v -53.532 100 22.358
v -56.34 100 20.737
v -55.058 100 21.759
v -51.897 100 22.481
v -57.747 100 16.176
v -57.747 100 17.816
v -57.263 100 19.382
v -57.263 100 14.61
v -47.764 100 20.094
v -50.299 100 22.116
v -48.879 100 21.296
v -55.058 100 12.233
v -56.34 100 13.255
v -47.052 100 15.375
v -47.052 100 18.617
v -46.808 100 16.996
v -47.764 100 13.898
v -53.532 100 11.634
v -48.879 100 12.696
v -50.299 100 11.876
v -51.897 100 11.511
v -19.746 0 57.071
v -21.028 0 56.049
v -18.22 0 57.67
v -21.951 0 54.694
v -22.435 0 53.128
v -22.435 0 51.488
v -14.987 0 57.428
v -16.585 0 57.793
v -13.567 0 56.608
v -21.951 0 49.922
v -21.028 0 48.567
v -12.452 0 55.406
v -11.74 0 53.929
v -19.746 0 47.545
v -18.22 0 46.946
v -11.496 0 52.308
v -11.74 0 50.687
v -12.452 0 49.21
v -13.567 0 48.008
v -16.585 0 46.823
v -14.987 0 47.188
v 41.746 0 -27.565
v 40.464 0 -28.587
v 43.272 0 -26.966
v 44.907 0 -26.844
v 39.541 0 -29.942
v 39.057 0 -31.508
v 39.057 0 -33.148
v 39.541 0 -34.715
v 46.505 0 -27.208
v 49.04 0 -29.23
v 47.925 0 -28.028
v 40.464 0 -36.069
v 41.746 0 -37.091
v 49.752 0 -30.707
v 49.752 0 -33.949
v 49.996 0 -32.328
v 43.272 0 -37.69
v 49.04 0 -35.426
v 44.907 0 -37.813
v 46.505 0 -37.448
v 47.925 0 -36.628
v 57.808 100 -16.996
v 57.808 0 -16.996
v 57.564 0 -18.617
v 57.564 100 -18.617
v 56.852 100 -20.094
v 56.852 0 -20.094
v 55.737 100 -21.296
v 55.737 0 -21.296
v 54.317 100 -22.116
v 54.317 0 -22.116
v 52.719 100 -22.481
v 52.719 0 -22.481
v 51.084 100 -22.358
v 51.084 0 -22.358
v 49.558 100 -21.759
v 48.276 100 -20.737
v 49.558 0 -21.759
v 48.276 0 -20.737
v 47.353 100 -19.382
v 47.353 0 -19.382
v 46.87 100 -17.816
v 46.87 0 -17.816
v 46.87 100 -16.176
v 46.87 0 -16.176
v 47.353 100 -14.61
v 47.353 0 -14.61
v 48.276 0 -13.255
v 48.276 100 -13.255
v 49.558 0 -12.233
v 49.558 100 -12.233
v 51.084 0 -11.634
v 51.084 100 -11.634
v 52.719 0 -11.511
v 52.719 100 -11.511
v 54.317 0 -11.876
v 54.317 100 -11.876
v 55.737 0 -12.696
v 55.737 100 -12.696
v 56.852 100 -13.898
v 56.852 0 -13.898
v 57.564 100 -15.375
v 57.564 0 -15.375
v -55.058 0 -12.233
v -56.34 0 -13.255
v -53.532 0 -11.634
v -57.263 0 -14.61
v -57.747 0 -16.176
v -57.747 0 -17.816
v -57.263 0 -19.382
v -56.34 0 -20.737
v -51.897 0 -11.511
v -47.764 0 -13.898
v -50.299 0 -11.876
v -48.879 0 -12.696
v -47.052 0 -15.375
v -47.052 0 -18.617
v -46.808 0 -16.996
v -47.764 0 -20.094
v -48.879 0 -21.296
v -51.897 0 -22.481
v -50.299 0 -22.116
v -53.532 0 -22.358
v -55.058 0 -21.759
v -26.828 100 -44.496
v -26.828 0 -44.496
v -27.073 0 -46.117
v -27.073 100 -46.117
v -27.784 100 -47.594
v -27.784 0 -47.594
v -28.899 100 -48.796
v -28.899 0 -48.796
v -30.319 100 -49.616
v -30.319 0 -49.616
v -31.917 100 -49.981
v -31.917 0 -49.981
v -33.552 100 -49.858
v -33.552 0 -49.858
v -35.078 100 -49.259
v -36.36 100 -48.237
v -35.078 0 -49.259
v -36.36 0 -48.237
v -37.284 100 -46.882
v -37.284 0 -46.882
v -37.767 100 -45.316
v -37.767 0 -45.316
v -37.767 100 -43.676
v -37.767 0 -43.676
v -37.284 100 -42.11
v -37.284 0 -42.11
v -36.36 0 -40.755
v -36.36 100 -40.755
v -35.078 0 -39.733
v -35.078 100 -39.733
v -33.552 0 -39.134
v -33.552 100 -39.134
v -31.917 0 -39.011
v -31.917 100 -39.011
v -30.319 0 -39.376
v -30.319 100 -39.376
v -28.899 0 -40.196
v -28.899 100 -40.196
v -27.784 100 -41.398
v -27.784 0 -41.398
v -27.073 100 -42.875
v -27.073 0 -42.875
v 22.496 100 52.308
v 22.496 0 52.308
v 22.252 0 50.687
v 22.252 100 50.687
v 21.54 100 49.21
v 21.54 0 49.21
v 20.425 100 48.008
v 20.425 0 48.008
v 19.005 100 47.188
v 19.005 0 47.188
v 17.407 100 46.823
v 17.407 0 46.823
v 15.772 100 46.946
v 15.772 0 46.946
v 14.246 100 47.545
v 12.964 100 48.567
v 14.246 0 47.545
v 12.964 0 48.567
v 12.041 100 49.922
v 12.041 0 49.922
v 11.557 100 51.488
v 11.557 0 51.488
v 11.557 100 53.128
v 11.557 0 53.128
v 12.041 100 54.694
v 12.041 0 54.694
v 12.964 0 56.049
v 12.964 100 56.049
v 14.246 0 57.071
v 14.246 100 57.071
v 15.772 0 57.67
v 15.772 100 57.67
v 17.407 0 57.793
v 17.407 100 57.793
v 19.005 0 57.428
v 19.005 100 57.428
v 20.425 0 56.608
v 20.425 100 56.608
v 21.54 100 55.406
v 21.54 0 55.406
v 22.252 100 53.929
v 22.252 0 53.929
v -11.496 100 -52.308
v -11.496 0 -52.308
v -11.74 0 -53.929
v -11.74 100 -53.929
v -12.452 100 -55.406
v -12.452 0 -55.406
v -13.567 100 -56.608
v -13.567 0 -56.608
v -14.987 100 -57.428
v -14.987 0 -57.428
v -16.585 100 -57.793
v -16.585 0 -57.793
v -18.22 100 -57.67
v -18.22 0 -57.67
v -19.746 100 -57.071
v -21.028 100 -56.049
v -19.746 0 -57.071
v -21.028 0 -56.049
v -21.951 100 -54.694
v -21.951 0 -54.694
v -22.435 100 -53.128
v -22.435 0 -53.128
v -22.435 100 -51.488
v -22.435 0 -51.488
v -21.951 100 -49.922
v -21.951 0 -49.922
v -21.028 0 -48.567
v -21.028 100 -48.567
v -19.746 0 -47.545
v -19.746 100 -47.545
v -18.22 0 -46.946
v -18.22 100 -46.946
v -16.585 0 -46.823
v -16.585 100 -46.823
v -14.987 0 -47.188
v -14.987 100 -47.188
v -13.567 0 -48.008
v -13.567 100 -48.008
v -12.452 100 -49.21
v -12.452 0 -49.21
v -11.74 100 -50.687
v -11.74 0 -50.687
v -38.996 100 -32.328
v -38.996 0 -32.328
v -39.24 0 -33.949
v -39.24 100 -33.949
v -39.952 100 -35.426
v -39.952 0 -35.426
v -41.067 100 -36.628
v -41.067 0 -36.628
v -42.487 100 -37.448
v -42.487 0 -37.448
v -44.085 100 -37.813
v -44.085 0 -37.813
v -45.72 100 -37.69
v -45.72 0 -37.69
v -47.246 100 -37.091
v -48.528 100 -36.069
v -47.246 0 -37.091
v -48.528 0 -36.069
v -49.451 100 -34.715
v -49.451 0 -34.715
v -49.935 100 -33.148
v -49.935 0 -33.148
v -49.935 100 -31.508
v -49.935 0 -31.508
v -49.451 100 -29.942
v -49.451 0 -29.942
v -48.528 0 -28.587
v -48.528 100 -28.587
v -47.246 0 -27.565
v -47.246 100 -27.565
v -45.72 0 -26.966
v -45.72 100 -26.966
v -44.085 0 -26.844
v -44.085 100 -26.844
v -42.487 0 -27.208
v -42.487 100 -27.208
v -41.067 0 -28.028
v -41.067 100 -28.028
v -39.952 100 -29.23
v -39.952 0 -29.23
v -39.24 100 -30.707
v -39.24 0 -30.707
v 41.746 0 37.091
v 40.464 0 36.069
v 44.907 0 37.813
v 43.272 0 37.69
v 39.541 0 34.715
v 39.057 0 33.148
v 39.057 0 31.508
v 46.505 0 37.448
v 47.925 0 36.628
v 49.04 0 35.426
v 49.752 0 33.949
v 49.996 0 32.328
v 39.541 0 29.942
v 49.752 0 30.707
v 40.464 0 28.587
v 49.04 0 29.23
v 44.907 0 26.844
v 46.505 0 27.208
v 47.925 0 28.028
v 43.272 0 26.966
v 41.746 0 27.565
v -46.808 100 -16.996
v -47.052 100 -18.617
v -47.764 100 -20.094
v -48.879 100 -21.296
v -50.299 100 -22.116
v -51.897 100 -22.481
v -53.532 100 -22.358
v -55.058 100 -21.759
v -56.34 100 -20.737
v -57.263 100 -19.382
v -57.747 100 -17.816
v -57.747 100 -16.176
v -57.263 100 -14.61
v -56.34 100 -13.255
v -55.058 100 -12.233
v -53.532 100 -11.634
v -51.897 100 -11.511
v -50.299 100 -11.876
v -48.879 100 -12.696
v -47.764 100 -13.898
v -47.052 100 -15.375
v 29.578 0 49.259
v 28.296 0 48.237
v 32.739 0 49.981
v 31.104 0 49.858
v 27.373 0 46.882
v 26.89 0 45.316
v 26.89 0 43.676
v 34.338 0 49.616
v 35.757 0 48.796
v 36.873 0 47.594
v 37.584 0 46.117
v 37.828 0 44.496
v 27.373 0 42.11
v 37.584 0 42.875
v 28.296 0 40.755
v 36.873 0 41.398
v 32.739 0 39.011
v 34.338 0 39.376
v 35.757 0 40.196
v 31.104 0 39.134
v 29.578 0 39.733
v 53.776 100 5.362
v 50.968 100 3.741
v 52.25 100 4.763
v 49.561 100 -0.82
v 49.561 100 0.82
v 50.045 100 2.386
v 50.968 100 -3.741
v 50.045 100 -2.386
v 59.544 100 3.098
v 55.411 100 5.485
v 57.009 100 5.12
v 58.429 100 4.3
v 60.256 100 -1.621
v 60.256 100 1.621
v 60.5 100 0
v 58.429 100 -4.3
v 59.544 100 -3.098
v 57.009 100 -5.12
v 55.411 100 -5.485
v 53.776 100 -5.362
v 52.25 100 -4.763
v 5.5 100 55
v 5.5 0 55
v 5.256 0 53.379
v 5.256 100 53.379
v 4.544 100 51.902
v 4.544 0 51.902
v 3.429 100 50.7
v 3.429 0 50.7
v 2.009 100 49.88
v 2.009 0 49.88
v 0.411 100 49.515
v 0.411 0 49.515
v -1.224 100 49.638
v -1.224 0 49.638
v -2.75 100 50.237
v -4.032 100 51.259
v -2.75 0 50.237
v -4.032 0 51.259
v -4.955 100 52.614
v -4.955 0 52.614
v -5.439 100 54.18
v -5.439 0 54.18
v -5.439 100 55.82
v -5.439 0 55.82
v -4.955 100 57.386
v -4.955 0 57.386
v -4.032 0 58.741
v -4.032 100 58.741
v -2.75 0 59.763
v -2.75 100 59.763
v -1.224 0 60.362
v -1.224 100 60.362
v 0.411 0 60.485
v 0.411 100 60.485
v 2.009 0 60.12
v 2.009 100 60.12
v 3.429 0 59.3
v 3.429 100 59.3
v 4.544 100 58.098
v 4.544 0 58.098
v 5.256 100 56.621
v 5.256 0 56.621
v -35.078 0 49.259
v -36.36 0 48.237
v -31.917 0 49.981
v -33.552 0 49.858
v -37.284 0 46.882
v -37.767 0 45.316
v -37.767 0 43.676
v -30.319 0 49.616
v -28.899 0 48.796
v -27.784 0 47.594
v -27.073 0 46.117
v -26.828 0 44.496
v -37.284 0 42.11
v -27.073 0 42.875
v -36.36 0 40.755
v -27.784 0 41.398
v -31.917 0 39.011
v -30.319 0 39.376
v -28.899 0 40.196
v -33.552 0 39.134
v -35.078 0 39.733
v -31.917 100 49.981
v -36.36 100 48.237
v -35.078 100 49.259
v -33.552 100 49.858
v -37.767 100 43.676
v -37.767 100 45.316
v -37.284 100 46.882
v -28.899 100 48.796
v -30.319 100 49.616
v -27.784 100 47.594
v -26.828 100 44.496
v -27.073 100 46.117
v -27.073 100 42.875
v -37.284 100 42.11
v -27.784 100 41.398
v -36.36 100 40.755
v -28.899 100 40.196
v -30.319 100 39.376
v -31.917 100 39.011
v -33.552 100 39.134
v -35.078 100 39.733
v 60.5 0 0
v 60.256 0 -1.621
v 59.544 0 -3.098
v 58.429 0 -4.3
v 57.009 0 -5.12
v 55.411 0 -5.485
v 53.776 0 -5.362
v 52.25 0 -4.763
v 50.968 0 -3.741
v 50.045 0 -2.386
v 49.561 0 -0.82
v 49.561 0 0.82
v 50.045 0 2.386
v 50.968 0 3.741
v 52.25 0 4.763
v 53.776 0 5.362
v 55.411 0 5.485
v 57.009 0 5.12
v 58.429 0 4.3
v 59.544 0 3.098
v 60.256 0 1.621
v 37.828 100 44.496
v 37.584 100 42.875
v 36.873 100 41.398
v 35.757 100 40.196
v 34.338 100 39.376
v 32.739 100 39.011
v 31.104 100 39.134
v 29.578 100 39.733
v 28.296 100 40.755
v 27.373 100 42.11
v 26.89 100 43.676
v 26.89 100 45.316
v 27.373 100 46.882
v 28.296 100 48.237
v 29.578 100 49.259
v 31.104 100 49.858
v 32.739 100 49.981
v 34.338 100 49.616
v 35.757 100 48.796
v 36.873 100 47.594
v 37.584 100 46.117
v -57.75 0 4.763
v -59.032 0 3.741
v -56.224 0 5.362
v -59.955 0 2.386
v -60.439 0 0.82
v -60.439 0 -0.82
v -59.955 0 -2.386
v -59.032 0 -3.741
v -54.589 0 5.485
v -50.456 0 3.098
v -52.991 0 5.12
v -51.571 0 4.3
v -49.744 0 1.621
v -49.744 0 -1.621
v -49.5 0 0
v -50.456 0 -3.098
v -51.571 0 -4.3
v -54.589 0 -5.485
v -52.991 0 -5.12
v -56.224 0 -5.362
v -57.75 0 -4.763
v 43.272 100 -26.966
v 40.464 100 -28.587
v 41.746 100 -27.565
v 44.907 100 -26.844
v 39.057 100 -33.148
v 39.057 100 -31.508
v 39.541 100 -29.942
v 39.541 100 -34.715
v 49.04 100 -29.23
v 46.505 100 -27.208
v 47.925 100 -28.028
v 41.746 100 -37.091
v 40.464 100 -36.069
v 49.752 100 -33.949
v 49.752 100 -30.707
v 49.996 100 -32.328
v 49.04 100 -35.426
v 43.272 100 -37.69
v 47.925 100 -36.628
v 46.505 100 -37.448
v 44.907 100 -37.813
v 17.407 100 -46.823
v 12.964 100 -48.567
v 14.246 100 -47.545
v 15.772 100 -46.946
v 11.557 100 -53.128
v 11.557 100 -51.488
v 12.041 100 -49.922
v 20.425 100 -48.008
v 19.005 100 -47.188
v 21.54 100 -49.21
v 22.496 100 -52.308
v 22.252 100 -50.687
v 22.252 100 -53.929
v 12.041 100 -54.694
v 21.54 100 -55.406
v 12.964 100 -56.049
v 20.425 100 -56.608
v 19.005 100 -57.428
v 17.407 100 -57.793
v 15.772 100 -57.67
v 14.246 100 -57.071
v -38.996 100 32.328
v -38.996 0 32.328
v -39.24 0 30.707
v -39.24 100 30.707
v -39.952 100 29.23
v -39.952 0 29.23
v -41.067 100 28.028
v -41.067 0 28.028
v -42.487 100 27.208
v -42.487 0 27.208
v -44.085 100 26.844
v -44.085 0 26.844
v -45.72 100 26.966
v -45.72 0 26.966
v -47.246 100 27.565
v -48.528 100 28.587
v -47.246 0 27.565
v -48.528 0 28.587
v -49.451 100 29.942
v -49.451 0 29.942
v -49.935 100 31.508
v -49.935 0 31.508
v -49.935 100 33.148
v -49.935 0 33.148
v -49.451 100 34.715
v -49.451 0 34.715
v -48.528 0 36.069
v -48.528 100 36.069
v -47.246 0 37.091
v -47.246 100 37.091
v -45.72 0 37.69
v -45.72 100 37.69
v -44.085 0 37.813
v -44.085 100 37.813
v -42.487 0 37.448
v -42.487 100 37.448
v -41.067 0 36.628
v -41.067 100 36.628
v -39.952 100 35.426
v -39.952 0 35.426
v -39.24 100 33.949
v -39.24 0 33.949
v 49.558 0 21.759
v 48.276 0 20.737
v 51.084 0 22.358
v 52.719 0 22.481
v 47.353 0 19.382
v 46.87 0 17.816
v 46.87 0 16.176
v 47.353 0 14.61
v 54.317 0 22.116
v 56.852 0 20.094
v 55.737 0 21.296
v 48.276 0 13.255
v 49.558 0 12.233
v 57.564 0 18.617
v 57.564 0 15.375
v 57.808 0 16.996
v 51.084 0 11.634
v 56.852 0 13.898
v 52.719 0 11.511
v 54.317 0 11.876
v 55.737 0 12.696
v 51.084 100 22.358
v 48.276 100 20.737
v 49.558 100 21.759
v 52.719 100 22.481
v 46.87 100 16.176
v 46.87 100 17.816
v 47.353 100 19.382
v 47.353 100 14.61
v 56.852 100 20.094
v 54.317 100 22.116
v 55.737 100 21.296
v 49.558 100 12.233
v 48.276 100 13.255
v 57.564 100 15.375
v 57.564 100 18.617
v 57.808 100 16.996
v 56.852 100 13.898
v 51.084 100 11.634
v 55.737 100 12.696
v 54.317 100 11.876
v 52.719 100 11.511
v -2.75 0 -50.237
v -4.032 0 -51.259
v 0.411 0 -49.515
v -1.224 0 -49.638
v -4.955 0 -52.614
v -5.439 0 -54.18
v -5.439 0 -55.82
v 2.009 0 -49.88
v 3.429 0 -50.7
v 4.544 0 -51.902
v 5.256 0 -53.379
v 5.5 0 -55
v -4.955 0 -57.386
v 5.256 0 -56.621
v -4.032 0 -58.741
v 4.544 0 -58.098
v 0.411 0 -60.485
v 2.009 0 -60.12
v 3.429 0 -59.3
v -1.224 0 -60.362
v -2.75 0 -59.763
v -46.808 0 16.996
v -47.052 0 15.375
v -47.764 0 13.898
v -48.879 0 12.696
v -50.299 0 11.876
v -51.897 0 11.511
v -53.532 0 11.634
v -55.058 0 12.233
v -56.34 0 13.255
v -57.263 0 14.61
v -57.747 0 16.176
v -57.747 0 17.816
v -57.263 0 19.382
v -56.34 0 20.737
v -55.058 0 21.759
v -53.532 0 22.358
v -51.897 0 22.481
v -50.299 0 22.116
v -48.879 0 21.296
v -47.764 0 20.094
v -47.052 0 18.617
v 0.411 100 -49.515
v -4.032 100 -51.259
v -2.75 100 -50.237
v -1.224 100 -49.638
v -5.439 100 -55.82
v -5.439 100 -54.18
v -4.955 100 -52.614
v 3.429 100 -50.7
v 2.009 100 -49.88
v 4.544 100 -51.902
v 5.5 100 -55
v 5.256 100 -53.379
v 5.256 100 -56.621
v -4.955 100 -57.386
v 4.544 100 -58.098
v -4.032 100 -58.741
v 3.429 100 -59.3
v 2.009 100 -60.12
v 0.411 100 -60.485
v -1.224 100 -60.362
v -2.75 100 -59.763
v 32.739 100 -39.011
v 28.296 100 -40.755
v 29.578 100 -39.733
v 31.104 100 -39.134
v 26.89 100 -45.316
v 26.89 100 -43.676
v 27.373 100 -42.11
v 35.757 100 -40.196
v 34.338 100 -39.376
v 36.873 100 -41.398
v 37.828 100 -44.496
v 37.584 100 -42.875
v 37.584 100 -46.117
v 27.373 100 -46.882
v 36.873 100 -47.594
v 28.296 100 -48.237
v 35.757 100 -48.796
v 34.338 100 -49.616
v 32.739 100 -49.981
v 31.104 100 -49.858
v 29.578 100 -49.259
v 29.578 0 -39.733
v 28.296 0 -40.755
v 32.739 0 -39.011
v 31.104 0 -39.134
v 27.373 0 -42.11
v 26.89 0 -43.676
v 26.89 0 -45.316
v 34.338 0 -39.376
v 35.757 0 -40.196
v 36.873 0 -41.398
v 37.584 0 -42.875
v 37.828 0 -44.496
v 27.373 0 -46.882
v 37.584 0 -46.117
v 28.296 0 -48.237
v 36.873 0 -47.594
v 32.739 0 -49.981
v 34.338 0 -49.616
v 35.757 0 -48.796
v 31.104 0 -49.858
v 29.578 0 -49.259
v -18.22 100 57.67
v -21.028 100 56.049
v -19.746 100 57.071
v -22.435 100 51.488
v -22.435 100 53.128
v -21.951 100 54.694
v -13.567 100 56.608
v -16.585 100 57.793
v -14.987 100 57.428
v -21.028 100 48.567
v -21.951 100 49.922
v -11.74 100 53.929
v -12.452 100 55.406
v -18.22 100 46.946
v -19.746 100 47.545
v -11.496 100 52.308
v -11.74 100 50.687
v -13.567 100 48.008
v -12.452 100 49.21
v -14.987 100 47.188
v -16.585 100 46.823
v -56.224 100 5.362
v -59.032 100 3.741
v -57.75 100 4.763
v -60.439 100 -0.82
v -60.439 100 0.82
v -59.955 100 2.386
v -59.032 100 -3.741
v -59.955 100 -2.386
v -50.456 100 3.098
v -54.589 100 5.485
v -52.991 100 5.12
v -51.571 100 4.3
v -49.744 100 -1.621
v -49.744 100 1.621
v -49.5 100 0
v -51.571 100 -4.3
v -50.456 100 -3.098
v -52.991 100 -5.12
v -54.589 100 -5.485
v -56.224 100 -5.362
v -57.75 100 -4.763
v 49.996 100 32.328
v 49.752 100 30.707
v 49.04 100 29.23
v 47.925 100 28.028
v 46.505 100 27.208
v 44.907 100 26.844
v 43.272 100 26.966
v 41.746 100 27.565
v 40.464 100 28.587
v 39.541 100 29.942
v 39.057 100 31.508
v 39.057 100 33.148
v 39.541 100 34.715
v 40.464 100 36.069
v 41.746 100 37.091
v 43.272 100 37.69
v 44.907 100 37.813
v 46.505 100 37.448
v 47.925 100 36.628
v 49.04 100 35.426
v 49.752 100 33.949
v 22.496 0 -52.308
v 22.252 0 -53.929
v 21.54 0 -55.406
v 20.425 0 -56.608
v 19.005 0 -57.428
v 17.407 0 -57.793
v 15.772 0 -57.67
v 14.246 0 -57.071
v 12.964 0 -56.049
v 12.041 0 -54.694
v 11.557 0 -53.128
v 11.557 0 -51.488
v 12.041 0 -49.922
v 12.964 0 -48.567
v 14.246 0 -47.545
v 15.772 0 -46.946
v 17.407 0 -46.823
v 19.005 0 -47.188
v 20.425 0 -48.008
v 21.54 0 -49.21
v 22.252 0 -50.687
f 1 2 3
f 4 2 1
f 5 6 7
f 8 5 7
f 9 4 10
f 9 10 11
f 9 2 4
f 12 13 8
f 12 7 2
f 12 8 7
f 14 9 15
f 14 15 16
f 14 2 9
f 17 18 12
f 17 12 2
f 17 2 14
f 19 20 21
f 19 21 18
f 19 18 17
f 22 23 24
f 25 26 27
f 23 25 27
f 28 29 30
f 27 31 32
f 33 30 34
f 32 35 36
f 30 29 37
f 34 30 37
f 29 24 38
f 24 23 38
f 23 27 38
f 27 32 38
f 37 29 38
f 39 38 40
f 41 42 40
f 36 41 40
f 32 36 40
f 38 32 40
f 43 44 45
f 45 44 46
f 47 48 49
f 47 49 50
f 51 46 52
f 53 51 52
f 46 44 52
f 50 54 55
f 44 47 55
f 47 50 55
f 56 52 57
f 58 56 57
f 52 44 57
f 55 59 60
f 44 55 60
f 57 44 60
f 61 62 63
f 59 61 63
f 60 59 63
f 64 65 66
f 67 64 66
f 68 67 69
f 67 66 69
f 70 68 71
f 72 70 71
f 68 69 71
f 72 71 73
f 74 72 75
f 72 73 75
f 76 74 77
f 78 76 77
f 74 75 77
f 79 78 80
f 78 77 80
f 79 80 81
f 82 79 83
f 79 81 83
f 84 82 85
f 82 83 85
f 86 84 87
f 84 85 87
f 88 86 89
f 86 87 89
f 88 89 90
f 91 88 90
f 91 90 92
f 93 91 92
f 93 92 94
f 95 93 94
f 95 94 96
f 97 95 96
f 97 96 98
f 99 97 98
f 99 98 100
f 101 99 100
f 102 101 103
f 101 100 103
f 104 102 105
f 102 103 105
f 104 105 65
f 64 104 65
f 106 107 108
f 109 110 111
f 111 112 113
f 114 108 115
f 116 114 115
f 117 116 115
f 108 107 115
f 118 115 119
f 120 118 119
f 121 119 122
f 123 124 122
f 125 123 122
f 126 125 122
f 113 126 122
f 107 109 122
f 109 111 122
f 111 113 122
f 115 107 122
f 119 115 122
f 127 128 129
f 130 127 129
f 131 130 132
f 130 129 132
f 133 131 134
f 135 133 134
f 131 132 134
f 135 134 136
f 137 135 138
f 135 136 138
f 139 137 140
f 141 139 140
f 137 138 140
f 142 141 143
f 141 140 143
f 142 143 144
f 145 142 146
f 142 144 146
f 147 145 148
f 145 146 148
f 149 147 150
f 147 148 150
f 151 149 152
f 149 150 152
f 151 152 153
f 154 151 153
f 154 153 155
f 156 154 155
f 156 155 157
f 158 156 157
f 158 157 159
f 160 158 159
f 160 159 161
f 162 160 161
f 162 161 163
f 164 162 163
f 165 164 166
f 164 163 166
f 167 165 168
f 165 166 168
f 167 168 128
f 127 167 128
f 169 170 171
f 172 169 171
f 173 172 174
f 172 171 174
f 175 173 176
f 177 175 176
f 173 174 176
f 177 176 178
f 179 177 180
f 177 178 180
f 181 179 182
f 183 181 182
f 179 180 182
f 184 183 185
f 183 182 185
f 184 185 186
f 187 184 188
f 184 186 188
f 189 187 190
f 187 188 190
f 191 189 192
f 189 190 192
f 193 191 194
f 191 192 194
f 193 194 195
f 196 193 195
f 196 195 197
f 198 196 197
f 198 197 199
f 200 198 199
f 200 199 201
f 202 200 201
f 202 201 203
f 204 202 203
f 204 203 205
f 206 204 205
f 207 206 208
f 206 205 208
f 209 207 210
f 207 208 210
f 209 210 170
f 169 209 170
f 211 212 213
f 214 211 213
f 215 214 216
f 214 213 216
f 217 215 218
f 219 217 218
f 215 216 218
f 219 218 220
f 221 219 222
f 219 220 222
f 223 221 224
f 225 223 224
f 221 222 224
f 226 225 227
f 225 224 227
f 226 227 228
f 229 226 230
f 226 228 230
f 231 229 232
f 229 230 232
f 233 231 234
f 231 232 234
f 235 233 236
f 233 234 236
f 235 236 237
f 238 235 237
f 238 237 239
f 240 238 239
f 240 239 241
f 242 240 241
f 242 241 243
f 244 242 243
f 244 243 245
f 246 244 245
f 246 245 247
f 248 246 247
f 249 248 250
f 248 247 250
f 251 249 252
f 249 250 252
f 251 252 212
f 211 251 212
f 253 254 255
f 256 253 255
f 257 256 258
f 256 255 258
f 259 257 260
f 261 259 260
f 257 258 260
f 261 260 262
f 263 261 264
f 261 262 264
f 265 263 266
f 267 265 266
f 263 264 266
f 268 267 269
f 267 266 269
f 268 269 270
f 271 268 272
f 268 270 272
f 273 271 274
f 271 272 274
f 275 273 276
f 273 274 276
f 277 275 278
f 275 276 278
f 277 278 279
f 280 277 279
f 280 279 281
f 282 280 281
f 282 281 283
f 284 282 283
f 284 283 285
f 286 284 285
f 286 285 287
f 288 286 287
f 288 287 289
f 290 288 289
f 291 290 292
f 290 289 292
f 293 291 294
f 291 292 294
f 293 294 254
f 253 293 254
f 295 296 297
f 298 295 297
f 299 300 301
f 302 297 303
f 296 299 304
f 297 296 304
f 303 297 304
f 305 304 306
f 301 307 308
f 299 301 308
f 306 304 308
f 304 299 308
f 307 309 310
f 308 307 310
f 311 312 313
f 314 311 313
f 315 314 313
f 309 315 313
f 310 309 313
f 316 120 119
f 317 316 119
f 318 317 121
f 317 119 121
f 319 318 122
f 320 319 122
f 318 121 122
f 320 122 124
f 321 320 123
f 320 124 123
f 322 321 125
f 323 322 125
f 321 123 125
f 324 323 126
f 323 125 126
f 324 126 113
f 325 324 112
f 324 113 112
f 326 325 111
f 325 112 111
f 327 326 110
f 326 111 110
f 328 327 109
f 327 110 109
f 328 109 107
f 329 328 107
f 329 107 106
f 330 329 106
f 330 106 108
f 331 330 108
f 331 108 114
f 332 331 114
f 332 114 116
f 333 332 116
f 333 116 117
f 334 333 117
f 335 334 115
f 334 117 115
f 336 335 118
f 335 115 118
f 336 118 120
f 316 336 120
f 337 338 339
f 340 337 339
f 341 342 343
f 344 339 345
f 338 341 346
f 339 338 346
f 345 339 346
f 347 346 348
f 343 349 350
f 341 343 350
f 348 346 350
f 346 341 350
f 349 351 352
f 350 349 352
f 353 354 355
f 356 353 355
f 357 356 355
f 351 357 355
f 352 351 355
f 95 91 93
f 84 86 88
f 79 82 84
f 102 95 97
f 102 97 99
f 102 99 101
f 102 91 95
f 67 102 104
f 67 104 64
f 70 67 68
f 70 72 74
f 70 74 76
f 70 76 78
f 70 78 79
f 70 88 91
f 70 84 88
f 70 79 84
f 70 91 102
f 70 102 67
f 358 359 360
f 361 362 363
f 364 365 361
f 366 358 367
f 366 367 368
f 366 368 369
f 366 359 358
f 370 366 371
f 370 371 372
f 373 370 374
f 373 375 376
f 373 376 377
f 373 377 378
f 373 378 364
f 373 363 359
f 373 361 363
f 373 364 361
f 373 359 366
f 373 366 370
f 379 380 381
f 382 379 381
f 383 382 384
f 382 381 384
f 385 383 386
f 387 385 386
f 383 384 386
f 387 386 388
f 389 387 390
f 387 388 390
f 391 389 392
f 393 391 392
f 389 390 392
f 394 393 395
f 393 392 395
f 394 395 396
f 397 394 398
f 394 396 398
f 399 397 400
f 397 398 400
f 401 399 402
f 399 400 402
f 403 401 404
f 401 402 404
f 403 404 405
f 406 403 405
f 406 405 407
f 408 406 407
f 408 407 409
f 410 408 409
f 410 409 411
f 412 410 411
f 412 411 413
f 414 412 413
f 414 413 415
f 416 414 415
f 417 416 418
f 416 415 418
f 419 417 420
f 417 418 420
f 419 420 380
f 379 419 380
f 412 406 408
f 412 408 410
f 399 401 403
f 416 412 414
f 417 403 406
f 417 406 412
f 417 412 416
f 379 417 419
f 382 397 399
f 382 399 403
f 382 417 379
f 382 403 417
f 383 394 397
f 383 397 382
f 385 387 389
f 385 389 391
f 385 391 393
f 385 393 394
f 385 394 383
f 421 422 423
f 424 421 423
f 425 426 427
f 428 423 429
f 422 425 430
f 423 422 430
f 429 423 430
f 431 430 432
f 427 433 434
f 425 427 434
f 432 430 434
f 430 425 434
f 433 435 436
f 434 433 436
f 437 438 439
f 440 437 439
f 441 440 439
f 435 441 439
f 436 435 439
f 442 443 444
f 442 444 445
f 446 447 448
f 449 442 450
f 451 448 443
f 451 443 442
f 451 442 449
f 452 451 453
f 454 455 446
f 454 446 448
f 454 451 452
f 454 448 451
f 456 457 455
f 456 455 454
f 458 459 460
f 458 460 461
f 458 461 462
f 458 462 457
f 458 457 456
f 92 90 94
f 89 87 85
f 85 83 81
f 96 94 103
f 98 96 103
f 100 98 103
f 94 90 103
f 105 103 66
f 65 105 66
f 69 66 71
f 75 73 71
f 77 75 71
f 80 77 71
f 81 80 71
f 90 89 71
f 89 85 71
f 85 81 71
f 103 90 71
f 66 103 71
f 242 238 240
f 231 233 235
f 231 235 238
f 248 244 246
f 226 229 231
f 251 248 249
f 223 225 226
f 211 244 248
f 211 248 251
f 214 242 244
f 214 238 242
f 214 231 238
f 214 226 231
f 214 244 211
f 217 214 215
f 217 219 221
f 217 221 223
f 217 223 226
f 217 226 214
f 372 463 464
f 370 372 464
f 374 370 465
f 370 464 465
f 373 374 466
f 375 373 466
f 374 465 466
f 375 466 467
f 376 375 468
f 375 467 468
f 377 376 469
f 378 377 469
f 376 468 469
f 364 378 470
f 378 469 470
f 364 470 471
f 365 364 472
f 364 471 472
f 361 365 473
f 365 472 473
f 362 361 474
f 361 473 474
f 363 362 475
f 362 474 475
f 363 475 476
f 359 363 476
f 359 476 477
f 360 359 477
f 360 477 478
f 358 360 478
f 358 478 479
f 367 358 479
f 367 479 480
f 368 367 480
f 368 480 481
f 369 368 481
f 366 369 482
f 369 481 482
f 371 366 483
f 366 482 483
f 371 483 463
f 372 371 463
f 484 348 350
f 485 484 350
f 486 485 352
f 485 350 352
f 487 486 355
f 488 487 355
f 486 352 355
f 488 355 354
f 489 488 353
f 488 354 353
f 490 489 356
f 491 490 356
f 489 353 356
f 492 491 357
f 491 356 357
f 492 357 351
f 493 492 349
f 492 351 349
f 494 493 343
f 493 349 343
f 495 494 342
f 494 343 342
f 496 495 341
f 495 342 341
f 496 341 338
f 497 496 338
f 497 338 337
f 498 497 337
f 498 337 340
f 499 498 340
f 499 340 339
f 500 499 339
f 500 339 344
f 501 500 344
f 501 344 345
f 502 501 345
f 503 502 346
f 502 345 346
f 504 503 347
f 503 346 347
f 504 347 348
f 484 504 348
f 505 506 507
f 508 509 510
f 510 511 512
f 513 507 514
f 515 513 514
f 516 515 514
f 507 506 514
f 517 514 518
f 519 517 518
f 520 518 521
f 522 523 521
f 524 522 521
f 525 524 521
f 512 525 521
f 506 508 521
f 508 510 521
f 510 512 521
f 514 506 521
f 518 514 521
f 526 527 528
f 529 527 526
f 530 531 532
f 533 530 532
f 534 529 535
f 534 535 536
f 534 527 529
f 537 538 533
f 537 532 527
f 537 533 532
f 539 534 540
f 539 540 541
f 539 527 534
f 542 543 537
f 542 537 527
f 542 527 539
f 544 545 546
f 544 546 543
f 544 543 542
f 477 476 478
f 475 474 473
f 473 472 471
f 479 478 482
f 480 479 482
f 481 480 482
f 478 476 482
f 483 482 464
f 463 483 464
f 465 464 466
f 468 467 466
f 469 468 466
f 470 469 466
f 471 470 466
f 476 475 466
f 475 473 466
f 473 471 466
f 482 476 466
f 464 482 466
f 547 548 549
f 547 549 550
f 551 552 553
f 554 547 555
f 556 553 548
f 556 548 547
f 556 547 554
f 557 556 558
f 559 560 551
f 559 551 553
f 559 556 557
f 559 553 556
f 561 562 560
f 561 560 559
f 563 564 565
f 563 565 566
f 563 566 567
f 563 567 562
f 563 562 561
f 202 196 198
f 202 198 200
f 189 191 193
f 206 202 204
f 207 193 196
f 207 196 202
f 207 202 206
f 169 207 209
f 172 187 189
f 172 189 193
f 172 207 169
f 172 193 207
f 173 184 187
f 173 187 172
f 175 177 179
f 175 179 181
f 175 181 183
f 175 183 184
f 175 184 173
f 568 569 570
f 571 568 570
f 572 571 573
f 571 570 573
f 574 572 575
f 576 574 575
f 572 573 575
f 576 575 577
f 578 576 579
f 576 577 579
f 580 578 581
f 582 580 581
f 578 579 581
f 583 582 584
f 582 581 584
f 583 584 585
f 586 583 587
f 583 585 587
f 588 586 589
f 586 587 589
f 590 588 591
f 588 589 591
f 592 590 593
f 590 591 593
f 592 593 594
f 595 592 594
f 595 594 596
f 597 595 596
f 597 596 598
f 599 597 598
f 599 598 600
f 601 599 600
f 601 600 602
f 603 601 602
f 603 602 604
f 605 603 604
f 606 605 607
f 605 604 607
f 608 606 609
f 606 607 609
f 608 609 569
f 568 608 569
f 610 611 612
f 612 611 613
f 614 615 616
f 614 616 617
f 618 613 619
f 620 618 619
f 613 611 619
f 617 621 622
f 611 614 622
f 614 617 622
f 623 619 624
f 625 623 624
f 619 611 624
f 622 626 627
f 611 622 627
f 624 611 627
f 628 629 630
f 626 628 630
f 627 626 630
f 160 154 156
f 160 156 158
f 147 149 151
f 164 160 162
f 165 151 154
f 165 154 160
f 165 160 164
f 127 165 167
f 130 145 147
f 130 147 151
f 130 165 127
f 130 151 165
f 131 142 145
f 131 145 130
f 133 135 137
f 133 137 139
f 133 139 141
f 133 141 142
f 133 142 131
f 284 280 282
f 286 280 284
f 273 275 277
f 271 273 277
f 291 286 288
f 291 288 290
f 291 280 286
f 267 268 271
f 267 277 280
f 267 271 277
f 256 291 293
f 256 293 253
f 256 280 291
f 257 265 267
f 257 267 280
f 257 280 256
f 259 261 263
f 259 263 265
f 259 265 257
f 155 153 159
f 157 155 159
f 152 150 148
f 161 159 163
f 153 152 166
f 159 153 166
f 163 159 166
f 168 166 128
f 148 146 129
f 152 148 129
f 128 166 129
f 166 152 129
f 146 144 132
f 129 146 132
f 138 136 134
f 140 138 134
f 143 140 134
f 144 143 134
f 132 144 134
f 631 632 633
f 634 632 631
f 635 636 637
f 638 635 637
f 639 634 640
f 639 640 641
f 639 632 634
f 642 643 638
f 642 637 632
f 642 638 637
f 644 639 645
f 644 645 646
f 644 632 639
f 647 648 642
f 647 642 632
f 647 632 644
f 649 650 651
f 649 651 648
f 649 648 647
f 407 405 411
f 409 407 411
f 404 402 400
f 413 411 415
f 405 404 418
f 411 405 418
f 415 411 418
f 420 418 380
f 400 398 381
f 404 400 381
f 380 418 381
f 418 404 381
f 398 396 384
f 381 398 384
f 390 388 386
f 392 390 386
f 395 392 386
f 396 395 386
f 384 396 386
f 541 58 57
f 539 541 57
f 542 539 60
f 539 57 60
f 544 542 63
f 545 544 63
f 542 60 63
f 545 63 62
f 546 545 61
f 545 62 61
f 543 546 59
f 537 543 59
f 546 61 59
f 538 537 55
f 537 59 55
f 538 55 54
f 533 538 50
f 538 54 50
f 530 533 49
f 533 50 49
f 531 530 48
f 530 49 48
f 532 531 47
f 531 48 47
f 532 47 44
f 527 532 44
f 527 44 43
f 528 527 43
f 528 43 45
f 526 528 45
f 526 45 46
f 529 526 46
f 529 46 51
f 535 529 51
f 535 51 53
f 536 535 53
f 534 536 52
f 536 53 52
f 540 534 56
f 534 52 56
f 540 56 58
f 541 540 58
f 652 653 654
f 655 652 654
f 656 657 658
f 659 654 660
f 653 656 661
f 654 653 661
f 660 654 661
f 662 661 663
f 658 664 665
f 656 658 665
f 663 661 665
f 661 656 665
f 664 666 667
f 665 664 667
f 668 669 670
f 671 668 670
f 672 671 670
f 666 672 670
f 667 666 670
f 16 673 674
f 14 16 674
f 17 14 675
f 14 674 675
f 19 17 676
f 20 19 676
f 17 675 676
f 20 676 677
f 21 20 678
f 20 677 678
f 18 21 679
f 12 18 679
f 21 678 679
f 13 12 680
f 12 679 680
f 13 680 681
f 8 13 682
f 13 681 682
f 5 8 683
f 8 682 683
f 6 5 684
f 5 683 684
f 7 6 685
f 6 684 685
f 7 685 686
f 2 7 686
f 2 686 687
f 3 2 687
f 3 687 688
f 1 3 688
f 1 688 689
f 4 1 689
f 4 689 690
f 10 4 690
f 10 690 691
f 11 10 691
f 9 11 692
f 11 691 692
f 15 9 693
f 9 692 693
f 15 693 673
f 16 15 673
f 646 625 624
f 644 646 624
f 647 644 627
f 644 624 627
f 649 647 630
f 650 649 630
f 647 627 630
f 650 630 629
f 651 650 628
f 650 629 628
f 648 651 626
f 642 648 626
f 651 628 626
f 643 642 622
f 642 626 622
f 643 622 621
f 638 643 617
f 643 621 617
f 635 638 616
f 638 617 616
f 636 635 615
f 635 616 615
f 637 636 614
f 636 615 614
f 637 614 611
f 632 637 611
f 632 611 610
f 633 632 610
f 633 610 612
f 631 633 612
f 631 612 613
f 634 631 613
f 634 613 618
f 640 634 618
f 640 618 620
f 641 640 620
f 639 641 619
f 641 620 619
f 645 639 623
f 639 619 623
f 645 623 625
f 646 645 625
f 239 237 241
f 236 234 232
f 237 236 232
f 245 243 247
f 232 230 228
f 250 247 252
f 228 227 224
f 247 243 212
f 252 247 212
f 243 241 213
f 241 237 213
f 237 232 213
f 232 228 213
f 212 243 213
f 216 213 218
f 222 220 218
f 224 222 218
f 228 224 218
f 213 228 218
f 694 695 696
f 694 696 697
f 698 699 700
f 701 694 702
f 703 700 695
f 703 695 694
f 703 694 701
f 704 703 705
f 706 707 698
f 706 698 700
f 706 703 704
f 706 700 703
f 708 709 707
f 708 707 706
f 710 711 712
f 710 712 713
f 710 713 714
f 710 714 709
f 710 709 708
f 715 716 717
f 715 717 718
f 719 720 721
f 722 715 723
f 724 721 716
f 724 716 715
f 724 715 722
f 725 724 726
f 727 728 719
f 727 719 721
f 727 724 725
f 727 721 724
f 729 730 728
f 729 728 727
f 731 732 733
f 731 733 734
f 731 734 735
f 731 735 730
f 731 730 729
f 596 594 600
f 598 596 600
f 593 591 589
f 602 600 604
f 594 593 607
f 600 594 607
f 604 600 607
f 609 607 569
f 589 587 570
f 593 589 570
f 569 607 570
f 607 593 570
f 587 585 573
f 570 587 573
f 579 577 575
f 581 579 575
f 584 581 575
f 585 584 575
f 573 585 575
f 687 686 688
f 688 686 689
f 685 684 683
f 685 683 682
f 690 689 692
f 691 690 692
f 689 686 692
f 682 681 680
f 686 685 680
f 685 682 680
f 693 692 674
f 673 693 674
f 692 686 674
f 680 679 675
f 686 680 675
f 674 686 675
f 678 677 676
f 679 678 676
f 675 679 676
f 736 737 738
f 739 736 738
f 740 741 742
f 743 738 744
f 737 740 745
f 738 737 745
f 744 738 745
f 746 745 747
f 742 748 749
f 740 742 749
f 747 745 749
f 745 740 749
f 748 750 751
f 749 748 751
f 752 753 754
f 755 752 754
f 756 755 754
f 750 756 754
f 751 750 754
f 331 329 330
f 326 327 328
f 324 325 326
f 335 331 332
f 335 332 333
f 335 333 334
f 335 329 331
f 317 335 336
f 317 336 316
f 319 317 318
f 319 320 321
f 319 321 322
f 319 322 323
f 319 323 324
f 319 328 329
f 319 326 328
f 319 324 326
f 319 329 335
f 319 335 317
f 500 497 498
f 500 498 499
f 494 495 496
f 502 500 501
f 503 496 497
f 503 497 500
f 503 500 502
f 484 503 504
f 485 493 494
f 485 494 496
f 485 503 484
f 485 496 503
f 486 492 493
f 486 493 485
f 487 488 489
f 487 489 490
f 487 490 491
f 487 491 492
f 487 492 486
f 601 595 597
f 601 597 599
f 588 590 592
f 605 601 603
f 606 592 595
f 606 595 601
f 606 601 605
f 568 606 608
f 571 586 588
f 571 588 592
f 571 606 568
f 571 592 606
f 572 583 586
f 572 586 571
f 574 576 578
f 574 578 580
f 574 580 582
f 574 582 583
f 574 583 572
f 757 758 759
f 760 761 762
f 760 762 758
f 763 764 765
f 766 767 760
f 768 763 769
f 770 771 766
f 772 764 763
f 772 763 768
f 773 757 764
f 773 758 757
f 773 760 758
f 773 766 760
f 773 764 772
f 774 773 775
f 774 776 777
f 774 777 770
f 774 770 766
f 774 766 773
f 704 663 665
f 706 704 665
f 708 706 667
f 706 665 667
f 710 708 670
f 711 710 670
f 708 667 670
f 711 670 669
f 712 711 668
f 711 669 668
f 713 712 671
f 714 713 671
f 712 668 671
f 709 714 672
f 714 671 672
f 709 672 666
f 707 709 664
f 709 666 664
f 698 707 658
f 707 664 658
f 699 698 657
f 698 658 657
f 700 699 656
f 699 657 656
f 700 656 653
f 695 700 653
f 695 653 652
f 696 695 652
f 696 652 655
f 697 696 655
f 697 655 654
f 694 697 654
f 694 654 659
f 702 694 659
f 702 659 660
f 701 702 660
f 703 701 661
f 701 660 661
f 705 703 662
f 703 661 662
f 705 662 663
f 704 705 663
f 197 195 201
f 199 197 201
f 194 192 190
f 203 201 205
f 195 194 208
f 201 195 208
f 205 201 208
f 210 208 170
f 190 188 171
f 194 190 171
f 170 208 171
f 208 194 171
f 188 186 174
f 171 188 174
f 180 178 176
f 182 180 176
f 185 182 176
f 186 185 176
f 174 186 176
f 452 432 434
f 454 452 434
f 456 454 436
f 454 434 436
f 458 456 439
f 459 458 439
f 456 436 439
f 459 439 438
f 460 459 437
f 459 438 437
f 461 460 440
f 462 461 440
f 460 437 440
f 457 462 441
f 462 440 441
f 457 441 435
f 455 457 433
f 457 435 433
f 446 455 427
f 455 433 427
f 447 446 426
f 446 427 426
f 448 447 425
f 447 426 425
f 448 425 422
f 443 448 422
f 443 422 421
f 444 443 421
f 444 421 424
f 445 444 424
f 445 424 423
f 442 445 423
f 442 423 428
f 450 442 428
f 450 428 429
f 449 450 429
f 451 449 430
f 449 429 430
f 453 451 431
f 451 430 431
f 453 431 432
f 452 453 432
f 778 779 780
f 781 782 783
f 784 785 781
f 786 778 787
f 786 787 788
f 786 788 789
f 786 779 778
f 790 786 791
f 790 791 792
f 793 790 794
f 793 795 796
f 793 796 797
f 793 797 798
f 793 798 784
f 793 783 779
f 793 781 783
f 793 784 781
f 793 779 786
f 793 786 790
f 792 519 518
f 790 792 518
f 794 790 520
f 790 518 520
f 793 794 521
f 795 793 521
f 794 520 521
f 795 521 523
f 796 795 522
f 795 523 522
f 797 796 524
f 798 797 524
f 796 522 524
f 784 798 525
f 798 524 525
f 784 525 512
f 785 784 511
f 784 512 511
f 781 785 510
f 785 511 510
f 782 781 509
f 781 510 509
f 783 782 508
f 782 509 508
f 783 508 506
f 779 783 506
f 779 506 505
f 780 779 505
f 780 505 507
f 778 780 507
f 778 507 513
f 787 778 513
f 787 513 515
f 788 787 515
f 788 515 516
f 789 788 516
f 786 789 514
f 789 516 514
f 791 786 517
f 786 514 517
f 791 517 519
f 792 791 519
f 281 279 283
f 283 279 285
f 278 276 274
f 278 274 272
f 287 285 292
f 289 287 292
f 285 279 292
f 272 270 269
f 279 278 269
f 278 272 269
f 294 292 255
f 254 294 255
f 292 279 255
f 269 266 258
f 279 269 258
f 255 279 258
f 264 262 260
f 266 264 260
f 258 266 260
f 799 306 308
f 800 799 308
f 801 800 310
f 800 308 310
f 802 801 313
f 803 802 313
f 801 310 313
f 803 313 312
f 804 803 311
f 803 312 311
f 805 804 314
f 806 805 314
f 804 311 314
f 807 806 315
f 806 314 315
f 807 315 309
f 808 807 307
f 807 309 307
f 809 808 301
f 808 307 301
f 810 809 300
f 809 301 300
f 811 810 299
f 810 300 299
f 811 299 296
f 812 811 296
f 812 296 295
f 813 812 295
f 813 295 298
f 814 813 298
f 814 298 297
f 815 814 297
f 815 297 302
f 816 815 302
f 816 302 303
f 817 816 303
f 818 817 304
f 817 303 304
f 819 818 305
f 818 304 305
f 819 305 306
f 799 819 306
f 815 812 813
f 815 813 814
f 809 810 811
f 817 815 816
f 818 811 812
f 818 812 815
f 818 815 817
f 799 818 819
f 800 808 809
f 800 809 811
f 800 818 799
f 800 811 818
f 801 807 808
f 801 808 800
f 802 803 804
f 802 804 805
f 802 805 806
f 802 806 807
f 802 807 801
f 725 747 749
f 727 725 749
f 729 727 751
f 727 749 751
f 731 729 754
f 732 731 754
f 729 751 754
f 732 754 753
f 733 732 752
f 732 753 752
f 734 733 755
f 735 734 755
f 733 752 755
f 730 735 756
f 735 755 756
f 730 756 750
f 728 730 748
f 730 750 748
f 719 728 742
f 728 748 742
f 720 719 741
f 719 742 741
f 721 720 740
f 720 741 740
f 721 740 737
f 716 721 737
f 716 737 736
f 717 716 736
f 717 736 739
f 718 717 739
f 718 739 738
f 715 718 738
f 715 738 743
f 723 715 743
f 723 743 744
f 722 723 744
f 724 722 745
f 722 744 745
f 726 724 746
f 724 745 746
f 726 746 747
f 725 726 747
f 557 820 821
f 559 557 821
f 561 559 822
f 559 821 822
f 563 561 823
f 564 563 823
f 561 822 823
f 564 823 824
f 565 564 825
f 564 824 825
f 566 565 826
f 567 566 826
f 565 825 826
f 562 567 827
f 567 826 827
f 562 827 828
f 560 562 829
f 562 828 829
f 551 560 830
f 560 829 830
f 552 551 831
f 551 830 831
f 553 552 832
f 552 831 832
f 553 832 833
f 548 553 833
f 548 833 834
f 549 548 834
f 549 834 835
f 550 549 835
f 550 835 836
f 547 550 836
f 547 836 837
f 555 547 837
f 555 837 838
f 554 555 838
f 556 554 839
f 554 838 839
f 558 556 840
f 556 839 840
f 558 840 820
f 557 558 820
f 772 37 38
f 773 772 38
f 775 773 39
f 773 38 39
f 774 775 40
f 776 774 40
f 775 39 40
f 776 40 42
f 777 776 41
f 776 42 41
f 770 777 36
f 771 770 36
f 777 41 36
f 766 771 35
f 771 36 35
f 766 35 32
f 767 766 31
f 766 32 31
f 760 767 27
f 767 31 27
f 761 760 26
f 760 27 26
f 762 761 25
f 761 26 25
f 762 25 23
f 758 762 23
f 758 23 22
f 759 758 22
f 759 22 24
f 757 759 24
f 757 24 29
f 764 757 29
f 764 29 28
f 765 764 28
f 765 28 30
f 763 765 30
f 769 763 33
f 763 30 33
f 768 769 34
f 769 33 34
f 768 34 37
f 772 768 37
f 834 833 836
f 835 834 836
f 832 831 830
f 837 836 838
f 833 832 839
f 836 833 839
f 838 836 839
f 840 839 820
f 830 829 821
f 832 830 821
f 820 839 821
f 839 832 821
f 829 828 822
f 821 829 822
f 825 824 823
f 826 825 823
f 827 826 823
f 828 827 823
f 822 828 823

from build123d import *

# Parameters (mm, degrees)
SKETCH1_R              = 5.5
BOSS_EXTRUDE1_DEPTH    = 100
BOSS_EXTRUDE1_2_DEPTH  = 100
BOSS_EXTRUDE1_3_DEPTH  = 100
BOSS_EXTRUDE1_4_DEPTH  = 100
BOSS_EXTRUDE1_5_DEPTH  = 100
BOSS_EXTRUDE1_6_DEPTH  = 100
BOSS_EXTRUDE1_7_DEPTH  = 100
BOSS_EXTRUDE1_8_DEPTH  = 100
BOSS_EXTRUDE1_9_DEPTH  = 100
BOSS_EXTRUDE1_10_DEPTH = 100
BOSS_EXTRUDE1_11_DEPTH = 100
BOSS_EXTRUDE1_12_DEPTH = 100
BOSS_EXTRUDE1_13_DEPTH = 100
BOSS_EXTRUDE1_14_DEPTH = 100
BOSS_EXTRUDE1_15_DEPTH = 100
BOSS_EXTRUDE1_16_DEPTH = 100
BOSS_EXTRUDE1_17_DEPTH = 100
BOSS_EXTRUDE1_18_DEPTH = 100
BOSS_EXTRUDE1_19_DEPTH = 100
BOSS_EXTRUDE1_20_DEPTH = 100


with BuildPart() as part:
    # Sketch1 → Boss-Extrude1 (new body)
    with BuildSketch(Plane(origin=(0, 0, 0), x_dir=(1, 0, 0), z_dir=(0, 1, 0))):
        with Locations((55, 0)):
            Circle(SKETCH1_R)
    extrude(amount=BOSS_EXTRUDE1_DEPTH)


with BuildPart() as body_2:
    # Sketch1 → Boss-Extrude1 2 (new body)
    with BuildSketch(Plane(origin=(0, 0, 0), x_dir=(1, 0, 0), z_dir=(0, 1, 0))):
        with Locations((52.308108396, -16.995934691)):
            Circle(SKETCH1_R)
    extrude(amount=BOSS_EXTRUDE1_2_DEPTH)


with BuildPart() as body_3:
    # Sketch1 → Boss-Extrude1 3 (new body)
    with BuildSketch(Plane(origin=(0, 0, 0), x_dir=(1, 0, 0), z_dir=(0, 1, 0))):
        with Locations((44.495934691, -32.328188876)):
            Circle(SKETCH1_R)
    extrude(amount=BOSS_EXTRUDE1_3_DEPTH)


with BuildPart() as body_4:
    # Sketch1 → Boss-Extrude1 4 (new body)
    with BuildSketch(Plane(origin=(0, 0, 0), x_dir=(1, 0, 0), z_dir=(0, 1, 0))):
        with Locations((32.328188876, -44.495934691)):
            Circle(SKETCH1_R)
    extrude(amount=BOSS_EXTRUDE1_4_DEPTH)


with BuildPart() as body_5:
    # Sketch1 → Boss-Extrude1 5 (new body)
    with BuildSketch(Plane(origin=(0, 0, 0), x_dir=(1, 0, 0), z_dir=(0, 1, 0))):
        with Locations((16.995934691, -52.308108396)):
            Circle(SKETCH1_R)
    extrude(amount=BOSS_EXTRUDE1_5_DEPTH)


with BuildPart() as body_6:
    # Sketch1 → Boss-Extrude1 6 (new body)
    with BuildSketch(Plane(origin=(0, 0, 0), x_dir=(1, 0, 0), z_dir=(0, 1, 0))):
        with Locations((0, -55)):
            Circle(SKETCH1_R)
    extrude(amount=BOSS_EXTRUDE1_6_DEPTH)


with BuildPart() as body_7:
    # Sketch1 → Boss-Extrude1 7 (new body)
    with BuildSketch(Plane(origin=(0, 0, 0), x_dir=(1, 0, 0), z_dir=(0, 1, 0))):
        with Locations((-16.995934691, -52.308108396)):
            Circle(SKETCH1_R)
    extrude(amount=BOSS_EXTRUDE1_7_DEPTH)


with BuildPart() as body_8:
    # Sketch1 → Boss-Extrude1 8 (new body)
    with BuildSketch(Plane(origin=(0, 0, 0), x_dir=(1, 0, 0), z_dir=(0, 1, 0))):
        with Locations((-32.328188876, -44.495934691)):
            Circle(SKETCH1_R)
    extrude(amount=BOSS_EXTRUDE1_8_DEPTH)


with BuildPart() as body_9:
    # Sketch1 → Boss-Extrude1 9 (new body)
    with BuildSketch(Plane(origin=(0, 0, 0), x_dir=(1, 0, 0), z_dir=(0, 1, 0))):
        with Locations((-44.495934691, -32.328188876)):
            Circle(SKETCH1_R)
    extrude(amount=BOSS_EXTRUDE1_9_DEPTH)


with BuildPart() as body_10:
    # Sketch1 → Boss-Extrude1 10 (new body)
    with BuildSketch(Plane(origin=(0, 0, 0), x_dir=(1, 0, 0), z_dir=(0, 1, 0))):
        with Locations((-52.308108396, -16.995934691)):
            Circle(SKETCH1_R)
    extrude(amount=BOSS_EXTRUDE1_10_DEPTH)


with BuildPart() as body_11:
    # Sketch1 → Boss-Extrude1 11 (new body)
    with BuildSketch(Plane(origin=(0, 0, 0), x_dir=(1, 0, 0), z_dir=(0, 1, 0))):
        with Locations((-55, 0)):
            Circle(SKETCH1_R)
    extrude(amount=BOSS_EXTRUDE1_11_DEPTH)


with BuildPart() as body_12:
    # Sketch1 → Boss-Extrude1 12 (new body)
    with BuildSketch(Plane(origin=(0, 0, 0), x_dir=(1, 0, 0), z_dir=(0, 1, 0))):
        with Locations((-52.308108396, 16.995934691)):
            Circle(SKETCH1_R)
    extrude(amount=BOSS_EXTRUDE1_12_DEPTH)


with BuildPart() as body_13:
    # Sketch1 → Boss-Extrude1 13 (new body)
    with BuildSketch(Plane(origin=(0, 0, 0), x_dir=(1, 0, 0), z_dir=(0, 1, 0))):
        with Locations((-44.495934691, 32.328188876)):
            Circle(SKETCH1_R)
    extrude(amount=BOSS_EXTRUDE1_13_DEPTH)


with BuildPart() as body_14:
    # Sketch1 → Boss-Extrude1 14 (new body)
    with BuildSketch(Plane(origin=(0, 0, 0), x_dir=(1, 0, 0), z_dir=(0, 1, 0))):
        with Locations((-32.328188876, 44.495934691)):
            Circle(SKETCH1_R)
    extrude(amount=BOSS_EXTRUDE1_14_DEPTH)


with BuildPart() as body_15:
    # Sketch1 → Boss-Extrude1 15 (new body)
    with BuildSketch(Plane(origin=(0, 0, 0), x_dir=(1, 0, 0), z_dir=(0, 1, 0))):
        with Locations((-16.995934691, 52.308108396)):
            Circle(SKETCH1_R)
    extrude(amount=BOSS_EXTRUDE1_15_DEPTH)


with BuildPart() as body_16:
    # Sketch1 → Boss-Extrude1 16 (new body)
    with BuildSketch(Plane(origin=(0, 0, 0), x_dir=(1, 0, 0), z_dir=(0, 1, 0))):
        with Locations((0, 55)):
            Circle(SKETCH1_R)
    extrude(amount=BOSS_EXTRUDE1_16_DEPTH)


with BuildPart() as body_17:
    # Sketch1 → Boss-Extrude1 17 (new body)
    with BuildSketch(Plane(origin=(0, 0, 0), x_dir=(1, 0, 0), z_dir=(0, 1, 0))):
        with Locations((16.995934691, 52.308108396)):
            Circle(SKETCH1_R)
    extrude(amount=BOSS_EXTRUDE1_17_DEPTH)


with BuildPart() as body_18:
    # Sketch1 → Boss-Extrude1 18 (new body)
    with BuildSketch(Plane(origin=(0, 0, 0), x_dir=(1, 0, 0), z_dir=(0, 1, 0))):
        with Locations((32.328188876, 44.495934691)):
            Circle(SKETCH1_R)
    extrude(amount=BOSS_EXTRUDE1_18_DEPTH)


with BuildPart() as body_19:
    # Sketch1 → Boss-Extrude1 19 (new body)
    with BuildSketch(Plane(origin=(0, 0, 0), x_dir=(1, 0, 0), z_dir=(0, 1, 0))):
        with Locations((44.495934691, 32.328188876)):
            Circle(SKETCH1_R)
    extrude(amount=BOSS_EXTRUDE1_19_DEPTH)


with BuildPart() as body_20:
    # Sketch1 → Boss-Extrude1 20 (new body)
    with BuildSketch(Plane(origin=(0, 0, 0), x_dir=(1, 0, 0), z_dir=(0, 1, 0))):
        with Locations((52.308108396, 16.995934691)):
            Circle(SKETCH1_R)
    extrude(amount=BOSS_EXTRUDE1_20_DEPTH)


solid = Compound([part.part, body_2.part, body_3.part, body_4.part, body_5.part, body_6.part, body_7.part, body_8.part, body_9.part, body_10.part, body_11.part, body_12.part, body_13.part, body_14.part, body_15.part, body_16.part, body_17.part, body_18.part, body_19.part, body_20.part])
